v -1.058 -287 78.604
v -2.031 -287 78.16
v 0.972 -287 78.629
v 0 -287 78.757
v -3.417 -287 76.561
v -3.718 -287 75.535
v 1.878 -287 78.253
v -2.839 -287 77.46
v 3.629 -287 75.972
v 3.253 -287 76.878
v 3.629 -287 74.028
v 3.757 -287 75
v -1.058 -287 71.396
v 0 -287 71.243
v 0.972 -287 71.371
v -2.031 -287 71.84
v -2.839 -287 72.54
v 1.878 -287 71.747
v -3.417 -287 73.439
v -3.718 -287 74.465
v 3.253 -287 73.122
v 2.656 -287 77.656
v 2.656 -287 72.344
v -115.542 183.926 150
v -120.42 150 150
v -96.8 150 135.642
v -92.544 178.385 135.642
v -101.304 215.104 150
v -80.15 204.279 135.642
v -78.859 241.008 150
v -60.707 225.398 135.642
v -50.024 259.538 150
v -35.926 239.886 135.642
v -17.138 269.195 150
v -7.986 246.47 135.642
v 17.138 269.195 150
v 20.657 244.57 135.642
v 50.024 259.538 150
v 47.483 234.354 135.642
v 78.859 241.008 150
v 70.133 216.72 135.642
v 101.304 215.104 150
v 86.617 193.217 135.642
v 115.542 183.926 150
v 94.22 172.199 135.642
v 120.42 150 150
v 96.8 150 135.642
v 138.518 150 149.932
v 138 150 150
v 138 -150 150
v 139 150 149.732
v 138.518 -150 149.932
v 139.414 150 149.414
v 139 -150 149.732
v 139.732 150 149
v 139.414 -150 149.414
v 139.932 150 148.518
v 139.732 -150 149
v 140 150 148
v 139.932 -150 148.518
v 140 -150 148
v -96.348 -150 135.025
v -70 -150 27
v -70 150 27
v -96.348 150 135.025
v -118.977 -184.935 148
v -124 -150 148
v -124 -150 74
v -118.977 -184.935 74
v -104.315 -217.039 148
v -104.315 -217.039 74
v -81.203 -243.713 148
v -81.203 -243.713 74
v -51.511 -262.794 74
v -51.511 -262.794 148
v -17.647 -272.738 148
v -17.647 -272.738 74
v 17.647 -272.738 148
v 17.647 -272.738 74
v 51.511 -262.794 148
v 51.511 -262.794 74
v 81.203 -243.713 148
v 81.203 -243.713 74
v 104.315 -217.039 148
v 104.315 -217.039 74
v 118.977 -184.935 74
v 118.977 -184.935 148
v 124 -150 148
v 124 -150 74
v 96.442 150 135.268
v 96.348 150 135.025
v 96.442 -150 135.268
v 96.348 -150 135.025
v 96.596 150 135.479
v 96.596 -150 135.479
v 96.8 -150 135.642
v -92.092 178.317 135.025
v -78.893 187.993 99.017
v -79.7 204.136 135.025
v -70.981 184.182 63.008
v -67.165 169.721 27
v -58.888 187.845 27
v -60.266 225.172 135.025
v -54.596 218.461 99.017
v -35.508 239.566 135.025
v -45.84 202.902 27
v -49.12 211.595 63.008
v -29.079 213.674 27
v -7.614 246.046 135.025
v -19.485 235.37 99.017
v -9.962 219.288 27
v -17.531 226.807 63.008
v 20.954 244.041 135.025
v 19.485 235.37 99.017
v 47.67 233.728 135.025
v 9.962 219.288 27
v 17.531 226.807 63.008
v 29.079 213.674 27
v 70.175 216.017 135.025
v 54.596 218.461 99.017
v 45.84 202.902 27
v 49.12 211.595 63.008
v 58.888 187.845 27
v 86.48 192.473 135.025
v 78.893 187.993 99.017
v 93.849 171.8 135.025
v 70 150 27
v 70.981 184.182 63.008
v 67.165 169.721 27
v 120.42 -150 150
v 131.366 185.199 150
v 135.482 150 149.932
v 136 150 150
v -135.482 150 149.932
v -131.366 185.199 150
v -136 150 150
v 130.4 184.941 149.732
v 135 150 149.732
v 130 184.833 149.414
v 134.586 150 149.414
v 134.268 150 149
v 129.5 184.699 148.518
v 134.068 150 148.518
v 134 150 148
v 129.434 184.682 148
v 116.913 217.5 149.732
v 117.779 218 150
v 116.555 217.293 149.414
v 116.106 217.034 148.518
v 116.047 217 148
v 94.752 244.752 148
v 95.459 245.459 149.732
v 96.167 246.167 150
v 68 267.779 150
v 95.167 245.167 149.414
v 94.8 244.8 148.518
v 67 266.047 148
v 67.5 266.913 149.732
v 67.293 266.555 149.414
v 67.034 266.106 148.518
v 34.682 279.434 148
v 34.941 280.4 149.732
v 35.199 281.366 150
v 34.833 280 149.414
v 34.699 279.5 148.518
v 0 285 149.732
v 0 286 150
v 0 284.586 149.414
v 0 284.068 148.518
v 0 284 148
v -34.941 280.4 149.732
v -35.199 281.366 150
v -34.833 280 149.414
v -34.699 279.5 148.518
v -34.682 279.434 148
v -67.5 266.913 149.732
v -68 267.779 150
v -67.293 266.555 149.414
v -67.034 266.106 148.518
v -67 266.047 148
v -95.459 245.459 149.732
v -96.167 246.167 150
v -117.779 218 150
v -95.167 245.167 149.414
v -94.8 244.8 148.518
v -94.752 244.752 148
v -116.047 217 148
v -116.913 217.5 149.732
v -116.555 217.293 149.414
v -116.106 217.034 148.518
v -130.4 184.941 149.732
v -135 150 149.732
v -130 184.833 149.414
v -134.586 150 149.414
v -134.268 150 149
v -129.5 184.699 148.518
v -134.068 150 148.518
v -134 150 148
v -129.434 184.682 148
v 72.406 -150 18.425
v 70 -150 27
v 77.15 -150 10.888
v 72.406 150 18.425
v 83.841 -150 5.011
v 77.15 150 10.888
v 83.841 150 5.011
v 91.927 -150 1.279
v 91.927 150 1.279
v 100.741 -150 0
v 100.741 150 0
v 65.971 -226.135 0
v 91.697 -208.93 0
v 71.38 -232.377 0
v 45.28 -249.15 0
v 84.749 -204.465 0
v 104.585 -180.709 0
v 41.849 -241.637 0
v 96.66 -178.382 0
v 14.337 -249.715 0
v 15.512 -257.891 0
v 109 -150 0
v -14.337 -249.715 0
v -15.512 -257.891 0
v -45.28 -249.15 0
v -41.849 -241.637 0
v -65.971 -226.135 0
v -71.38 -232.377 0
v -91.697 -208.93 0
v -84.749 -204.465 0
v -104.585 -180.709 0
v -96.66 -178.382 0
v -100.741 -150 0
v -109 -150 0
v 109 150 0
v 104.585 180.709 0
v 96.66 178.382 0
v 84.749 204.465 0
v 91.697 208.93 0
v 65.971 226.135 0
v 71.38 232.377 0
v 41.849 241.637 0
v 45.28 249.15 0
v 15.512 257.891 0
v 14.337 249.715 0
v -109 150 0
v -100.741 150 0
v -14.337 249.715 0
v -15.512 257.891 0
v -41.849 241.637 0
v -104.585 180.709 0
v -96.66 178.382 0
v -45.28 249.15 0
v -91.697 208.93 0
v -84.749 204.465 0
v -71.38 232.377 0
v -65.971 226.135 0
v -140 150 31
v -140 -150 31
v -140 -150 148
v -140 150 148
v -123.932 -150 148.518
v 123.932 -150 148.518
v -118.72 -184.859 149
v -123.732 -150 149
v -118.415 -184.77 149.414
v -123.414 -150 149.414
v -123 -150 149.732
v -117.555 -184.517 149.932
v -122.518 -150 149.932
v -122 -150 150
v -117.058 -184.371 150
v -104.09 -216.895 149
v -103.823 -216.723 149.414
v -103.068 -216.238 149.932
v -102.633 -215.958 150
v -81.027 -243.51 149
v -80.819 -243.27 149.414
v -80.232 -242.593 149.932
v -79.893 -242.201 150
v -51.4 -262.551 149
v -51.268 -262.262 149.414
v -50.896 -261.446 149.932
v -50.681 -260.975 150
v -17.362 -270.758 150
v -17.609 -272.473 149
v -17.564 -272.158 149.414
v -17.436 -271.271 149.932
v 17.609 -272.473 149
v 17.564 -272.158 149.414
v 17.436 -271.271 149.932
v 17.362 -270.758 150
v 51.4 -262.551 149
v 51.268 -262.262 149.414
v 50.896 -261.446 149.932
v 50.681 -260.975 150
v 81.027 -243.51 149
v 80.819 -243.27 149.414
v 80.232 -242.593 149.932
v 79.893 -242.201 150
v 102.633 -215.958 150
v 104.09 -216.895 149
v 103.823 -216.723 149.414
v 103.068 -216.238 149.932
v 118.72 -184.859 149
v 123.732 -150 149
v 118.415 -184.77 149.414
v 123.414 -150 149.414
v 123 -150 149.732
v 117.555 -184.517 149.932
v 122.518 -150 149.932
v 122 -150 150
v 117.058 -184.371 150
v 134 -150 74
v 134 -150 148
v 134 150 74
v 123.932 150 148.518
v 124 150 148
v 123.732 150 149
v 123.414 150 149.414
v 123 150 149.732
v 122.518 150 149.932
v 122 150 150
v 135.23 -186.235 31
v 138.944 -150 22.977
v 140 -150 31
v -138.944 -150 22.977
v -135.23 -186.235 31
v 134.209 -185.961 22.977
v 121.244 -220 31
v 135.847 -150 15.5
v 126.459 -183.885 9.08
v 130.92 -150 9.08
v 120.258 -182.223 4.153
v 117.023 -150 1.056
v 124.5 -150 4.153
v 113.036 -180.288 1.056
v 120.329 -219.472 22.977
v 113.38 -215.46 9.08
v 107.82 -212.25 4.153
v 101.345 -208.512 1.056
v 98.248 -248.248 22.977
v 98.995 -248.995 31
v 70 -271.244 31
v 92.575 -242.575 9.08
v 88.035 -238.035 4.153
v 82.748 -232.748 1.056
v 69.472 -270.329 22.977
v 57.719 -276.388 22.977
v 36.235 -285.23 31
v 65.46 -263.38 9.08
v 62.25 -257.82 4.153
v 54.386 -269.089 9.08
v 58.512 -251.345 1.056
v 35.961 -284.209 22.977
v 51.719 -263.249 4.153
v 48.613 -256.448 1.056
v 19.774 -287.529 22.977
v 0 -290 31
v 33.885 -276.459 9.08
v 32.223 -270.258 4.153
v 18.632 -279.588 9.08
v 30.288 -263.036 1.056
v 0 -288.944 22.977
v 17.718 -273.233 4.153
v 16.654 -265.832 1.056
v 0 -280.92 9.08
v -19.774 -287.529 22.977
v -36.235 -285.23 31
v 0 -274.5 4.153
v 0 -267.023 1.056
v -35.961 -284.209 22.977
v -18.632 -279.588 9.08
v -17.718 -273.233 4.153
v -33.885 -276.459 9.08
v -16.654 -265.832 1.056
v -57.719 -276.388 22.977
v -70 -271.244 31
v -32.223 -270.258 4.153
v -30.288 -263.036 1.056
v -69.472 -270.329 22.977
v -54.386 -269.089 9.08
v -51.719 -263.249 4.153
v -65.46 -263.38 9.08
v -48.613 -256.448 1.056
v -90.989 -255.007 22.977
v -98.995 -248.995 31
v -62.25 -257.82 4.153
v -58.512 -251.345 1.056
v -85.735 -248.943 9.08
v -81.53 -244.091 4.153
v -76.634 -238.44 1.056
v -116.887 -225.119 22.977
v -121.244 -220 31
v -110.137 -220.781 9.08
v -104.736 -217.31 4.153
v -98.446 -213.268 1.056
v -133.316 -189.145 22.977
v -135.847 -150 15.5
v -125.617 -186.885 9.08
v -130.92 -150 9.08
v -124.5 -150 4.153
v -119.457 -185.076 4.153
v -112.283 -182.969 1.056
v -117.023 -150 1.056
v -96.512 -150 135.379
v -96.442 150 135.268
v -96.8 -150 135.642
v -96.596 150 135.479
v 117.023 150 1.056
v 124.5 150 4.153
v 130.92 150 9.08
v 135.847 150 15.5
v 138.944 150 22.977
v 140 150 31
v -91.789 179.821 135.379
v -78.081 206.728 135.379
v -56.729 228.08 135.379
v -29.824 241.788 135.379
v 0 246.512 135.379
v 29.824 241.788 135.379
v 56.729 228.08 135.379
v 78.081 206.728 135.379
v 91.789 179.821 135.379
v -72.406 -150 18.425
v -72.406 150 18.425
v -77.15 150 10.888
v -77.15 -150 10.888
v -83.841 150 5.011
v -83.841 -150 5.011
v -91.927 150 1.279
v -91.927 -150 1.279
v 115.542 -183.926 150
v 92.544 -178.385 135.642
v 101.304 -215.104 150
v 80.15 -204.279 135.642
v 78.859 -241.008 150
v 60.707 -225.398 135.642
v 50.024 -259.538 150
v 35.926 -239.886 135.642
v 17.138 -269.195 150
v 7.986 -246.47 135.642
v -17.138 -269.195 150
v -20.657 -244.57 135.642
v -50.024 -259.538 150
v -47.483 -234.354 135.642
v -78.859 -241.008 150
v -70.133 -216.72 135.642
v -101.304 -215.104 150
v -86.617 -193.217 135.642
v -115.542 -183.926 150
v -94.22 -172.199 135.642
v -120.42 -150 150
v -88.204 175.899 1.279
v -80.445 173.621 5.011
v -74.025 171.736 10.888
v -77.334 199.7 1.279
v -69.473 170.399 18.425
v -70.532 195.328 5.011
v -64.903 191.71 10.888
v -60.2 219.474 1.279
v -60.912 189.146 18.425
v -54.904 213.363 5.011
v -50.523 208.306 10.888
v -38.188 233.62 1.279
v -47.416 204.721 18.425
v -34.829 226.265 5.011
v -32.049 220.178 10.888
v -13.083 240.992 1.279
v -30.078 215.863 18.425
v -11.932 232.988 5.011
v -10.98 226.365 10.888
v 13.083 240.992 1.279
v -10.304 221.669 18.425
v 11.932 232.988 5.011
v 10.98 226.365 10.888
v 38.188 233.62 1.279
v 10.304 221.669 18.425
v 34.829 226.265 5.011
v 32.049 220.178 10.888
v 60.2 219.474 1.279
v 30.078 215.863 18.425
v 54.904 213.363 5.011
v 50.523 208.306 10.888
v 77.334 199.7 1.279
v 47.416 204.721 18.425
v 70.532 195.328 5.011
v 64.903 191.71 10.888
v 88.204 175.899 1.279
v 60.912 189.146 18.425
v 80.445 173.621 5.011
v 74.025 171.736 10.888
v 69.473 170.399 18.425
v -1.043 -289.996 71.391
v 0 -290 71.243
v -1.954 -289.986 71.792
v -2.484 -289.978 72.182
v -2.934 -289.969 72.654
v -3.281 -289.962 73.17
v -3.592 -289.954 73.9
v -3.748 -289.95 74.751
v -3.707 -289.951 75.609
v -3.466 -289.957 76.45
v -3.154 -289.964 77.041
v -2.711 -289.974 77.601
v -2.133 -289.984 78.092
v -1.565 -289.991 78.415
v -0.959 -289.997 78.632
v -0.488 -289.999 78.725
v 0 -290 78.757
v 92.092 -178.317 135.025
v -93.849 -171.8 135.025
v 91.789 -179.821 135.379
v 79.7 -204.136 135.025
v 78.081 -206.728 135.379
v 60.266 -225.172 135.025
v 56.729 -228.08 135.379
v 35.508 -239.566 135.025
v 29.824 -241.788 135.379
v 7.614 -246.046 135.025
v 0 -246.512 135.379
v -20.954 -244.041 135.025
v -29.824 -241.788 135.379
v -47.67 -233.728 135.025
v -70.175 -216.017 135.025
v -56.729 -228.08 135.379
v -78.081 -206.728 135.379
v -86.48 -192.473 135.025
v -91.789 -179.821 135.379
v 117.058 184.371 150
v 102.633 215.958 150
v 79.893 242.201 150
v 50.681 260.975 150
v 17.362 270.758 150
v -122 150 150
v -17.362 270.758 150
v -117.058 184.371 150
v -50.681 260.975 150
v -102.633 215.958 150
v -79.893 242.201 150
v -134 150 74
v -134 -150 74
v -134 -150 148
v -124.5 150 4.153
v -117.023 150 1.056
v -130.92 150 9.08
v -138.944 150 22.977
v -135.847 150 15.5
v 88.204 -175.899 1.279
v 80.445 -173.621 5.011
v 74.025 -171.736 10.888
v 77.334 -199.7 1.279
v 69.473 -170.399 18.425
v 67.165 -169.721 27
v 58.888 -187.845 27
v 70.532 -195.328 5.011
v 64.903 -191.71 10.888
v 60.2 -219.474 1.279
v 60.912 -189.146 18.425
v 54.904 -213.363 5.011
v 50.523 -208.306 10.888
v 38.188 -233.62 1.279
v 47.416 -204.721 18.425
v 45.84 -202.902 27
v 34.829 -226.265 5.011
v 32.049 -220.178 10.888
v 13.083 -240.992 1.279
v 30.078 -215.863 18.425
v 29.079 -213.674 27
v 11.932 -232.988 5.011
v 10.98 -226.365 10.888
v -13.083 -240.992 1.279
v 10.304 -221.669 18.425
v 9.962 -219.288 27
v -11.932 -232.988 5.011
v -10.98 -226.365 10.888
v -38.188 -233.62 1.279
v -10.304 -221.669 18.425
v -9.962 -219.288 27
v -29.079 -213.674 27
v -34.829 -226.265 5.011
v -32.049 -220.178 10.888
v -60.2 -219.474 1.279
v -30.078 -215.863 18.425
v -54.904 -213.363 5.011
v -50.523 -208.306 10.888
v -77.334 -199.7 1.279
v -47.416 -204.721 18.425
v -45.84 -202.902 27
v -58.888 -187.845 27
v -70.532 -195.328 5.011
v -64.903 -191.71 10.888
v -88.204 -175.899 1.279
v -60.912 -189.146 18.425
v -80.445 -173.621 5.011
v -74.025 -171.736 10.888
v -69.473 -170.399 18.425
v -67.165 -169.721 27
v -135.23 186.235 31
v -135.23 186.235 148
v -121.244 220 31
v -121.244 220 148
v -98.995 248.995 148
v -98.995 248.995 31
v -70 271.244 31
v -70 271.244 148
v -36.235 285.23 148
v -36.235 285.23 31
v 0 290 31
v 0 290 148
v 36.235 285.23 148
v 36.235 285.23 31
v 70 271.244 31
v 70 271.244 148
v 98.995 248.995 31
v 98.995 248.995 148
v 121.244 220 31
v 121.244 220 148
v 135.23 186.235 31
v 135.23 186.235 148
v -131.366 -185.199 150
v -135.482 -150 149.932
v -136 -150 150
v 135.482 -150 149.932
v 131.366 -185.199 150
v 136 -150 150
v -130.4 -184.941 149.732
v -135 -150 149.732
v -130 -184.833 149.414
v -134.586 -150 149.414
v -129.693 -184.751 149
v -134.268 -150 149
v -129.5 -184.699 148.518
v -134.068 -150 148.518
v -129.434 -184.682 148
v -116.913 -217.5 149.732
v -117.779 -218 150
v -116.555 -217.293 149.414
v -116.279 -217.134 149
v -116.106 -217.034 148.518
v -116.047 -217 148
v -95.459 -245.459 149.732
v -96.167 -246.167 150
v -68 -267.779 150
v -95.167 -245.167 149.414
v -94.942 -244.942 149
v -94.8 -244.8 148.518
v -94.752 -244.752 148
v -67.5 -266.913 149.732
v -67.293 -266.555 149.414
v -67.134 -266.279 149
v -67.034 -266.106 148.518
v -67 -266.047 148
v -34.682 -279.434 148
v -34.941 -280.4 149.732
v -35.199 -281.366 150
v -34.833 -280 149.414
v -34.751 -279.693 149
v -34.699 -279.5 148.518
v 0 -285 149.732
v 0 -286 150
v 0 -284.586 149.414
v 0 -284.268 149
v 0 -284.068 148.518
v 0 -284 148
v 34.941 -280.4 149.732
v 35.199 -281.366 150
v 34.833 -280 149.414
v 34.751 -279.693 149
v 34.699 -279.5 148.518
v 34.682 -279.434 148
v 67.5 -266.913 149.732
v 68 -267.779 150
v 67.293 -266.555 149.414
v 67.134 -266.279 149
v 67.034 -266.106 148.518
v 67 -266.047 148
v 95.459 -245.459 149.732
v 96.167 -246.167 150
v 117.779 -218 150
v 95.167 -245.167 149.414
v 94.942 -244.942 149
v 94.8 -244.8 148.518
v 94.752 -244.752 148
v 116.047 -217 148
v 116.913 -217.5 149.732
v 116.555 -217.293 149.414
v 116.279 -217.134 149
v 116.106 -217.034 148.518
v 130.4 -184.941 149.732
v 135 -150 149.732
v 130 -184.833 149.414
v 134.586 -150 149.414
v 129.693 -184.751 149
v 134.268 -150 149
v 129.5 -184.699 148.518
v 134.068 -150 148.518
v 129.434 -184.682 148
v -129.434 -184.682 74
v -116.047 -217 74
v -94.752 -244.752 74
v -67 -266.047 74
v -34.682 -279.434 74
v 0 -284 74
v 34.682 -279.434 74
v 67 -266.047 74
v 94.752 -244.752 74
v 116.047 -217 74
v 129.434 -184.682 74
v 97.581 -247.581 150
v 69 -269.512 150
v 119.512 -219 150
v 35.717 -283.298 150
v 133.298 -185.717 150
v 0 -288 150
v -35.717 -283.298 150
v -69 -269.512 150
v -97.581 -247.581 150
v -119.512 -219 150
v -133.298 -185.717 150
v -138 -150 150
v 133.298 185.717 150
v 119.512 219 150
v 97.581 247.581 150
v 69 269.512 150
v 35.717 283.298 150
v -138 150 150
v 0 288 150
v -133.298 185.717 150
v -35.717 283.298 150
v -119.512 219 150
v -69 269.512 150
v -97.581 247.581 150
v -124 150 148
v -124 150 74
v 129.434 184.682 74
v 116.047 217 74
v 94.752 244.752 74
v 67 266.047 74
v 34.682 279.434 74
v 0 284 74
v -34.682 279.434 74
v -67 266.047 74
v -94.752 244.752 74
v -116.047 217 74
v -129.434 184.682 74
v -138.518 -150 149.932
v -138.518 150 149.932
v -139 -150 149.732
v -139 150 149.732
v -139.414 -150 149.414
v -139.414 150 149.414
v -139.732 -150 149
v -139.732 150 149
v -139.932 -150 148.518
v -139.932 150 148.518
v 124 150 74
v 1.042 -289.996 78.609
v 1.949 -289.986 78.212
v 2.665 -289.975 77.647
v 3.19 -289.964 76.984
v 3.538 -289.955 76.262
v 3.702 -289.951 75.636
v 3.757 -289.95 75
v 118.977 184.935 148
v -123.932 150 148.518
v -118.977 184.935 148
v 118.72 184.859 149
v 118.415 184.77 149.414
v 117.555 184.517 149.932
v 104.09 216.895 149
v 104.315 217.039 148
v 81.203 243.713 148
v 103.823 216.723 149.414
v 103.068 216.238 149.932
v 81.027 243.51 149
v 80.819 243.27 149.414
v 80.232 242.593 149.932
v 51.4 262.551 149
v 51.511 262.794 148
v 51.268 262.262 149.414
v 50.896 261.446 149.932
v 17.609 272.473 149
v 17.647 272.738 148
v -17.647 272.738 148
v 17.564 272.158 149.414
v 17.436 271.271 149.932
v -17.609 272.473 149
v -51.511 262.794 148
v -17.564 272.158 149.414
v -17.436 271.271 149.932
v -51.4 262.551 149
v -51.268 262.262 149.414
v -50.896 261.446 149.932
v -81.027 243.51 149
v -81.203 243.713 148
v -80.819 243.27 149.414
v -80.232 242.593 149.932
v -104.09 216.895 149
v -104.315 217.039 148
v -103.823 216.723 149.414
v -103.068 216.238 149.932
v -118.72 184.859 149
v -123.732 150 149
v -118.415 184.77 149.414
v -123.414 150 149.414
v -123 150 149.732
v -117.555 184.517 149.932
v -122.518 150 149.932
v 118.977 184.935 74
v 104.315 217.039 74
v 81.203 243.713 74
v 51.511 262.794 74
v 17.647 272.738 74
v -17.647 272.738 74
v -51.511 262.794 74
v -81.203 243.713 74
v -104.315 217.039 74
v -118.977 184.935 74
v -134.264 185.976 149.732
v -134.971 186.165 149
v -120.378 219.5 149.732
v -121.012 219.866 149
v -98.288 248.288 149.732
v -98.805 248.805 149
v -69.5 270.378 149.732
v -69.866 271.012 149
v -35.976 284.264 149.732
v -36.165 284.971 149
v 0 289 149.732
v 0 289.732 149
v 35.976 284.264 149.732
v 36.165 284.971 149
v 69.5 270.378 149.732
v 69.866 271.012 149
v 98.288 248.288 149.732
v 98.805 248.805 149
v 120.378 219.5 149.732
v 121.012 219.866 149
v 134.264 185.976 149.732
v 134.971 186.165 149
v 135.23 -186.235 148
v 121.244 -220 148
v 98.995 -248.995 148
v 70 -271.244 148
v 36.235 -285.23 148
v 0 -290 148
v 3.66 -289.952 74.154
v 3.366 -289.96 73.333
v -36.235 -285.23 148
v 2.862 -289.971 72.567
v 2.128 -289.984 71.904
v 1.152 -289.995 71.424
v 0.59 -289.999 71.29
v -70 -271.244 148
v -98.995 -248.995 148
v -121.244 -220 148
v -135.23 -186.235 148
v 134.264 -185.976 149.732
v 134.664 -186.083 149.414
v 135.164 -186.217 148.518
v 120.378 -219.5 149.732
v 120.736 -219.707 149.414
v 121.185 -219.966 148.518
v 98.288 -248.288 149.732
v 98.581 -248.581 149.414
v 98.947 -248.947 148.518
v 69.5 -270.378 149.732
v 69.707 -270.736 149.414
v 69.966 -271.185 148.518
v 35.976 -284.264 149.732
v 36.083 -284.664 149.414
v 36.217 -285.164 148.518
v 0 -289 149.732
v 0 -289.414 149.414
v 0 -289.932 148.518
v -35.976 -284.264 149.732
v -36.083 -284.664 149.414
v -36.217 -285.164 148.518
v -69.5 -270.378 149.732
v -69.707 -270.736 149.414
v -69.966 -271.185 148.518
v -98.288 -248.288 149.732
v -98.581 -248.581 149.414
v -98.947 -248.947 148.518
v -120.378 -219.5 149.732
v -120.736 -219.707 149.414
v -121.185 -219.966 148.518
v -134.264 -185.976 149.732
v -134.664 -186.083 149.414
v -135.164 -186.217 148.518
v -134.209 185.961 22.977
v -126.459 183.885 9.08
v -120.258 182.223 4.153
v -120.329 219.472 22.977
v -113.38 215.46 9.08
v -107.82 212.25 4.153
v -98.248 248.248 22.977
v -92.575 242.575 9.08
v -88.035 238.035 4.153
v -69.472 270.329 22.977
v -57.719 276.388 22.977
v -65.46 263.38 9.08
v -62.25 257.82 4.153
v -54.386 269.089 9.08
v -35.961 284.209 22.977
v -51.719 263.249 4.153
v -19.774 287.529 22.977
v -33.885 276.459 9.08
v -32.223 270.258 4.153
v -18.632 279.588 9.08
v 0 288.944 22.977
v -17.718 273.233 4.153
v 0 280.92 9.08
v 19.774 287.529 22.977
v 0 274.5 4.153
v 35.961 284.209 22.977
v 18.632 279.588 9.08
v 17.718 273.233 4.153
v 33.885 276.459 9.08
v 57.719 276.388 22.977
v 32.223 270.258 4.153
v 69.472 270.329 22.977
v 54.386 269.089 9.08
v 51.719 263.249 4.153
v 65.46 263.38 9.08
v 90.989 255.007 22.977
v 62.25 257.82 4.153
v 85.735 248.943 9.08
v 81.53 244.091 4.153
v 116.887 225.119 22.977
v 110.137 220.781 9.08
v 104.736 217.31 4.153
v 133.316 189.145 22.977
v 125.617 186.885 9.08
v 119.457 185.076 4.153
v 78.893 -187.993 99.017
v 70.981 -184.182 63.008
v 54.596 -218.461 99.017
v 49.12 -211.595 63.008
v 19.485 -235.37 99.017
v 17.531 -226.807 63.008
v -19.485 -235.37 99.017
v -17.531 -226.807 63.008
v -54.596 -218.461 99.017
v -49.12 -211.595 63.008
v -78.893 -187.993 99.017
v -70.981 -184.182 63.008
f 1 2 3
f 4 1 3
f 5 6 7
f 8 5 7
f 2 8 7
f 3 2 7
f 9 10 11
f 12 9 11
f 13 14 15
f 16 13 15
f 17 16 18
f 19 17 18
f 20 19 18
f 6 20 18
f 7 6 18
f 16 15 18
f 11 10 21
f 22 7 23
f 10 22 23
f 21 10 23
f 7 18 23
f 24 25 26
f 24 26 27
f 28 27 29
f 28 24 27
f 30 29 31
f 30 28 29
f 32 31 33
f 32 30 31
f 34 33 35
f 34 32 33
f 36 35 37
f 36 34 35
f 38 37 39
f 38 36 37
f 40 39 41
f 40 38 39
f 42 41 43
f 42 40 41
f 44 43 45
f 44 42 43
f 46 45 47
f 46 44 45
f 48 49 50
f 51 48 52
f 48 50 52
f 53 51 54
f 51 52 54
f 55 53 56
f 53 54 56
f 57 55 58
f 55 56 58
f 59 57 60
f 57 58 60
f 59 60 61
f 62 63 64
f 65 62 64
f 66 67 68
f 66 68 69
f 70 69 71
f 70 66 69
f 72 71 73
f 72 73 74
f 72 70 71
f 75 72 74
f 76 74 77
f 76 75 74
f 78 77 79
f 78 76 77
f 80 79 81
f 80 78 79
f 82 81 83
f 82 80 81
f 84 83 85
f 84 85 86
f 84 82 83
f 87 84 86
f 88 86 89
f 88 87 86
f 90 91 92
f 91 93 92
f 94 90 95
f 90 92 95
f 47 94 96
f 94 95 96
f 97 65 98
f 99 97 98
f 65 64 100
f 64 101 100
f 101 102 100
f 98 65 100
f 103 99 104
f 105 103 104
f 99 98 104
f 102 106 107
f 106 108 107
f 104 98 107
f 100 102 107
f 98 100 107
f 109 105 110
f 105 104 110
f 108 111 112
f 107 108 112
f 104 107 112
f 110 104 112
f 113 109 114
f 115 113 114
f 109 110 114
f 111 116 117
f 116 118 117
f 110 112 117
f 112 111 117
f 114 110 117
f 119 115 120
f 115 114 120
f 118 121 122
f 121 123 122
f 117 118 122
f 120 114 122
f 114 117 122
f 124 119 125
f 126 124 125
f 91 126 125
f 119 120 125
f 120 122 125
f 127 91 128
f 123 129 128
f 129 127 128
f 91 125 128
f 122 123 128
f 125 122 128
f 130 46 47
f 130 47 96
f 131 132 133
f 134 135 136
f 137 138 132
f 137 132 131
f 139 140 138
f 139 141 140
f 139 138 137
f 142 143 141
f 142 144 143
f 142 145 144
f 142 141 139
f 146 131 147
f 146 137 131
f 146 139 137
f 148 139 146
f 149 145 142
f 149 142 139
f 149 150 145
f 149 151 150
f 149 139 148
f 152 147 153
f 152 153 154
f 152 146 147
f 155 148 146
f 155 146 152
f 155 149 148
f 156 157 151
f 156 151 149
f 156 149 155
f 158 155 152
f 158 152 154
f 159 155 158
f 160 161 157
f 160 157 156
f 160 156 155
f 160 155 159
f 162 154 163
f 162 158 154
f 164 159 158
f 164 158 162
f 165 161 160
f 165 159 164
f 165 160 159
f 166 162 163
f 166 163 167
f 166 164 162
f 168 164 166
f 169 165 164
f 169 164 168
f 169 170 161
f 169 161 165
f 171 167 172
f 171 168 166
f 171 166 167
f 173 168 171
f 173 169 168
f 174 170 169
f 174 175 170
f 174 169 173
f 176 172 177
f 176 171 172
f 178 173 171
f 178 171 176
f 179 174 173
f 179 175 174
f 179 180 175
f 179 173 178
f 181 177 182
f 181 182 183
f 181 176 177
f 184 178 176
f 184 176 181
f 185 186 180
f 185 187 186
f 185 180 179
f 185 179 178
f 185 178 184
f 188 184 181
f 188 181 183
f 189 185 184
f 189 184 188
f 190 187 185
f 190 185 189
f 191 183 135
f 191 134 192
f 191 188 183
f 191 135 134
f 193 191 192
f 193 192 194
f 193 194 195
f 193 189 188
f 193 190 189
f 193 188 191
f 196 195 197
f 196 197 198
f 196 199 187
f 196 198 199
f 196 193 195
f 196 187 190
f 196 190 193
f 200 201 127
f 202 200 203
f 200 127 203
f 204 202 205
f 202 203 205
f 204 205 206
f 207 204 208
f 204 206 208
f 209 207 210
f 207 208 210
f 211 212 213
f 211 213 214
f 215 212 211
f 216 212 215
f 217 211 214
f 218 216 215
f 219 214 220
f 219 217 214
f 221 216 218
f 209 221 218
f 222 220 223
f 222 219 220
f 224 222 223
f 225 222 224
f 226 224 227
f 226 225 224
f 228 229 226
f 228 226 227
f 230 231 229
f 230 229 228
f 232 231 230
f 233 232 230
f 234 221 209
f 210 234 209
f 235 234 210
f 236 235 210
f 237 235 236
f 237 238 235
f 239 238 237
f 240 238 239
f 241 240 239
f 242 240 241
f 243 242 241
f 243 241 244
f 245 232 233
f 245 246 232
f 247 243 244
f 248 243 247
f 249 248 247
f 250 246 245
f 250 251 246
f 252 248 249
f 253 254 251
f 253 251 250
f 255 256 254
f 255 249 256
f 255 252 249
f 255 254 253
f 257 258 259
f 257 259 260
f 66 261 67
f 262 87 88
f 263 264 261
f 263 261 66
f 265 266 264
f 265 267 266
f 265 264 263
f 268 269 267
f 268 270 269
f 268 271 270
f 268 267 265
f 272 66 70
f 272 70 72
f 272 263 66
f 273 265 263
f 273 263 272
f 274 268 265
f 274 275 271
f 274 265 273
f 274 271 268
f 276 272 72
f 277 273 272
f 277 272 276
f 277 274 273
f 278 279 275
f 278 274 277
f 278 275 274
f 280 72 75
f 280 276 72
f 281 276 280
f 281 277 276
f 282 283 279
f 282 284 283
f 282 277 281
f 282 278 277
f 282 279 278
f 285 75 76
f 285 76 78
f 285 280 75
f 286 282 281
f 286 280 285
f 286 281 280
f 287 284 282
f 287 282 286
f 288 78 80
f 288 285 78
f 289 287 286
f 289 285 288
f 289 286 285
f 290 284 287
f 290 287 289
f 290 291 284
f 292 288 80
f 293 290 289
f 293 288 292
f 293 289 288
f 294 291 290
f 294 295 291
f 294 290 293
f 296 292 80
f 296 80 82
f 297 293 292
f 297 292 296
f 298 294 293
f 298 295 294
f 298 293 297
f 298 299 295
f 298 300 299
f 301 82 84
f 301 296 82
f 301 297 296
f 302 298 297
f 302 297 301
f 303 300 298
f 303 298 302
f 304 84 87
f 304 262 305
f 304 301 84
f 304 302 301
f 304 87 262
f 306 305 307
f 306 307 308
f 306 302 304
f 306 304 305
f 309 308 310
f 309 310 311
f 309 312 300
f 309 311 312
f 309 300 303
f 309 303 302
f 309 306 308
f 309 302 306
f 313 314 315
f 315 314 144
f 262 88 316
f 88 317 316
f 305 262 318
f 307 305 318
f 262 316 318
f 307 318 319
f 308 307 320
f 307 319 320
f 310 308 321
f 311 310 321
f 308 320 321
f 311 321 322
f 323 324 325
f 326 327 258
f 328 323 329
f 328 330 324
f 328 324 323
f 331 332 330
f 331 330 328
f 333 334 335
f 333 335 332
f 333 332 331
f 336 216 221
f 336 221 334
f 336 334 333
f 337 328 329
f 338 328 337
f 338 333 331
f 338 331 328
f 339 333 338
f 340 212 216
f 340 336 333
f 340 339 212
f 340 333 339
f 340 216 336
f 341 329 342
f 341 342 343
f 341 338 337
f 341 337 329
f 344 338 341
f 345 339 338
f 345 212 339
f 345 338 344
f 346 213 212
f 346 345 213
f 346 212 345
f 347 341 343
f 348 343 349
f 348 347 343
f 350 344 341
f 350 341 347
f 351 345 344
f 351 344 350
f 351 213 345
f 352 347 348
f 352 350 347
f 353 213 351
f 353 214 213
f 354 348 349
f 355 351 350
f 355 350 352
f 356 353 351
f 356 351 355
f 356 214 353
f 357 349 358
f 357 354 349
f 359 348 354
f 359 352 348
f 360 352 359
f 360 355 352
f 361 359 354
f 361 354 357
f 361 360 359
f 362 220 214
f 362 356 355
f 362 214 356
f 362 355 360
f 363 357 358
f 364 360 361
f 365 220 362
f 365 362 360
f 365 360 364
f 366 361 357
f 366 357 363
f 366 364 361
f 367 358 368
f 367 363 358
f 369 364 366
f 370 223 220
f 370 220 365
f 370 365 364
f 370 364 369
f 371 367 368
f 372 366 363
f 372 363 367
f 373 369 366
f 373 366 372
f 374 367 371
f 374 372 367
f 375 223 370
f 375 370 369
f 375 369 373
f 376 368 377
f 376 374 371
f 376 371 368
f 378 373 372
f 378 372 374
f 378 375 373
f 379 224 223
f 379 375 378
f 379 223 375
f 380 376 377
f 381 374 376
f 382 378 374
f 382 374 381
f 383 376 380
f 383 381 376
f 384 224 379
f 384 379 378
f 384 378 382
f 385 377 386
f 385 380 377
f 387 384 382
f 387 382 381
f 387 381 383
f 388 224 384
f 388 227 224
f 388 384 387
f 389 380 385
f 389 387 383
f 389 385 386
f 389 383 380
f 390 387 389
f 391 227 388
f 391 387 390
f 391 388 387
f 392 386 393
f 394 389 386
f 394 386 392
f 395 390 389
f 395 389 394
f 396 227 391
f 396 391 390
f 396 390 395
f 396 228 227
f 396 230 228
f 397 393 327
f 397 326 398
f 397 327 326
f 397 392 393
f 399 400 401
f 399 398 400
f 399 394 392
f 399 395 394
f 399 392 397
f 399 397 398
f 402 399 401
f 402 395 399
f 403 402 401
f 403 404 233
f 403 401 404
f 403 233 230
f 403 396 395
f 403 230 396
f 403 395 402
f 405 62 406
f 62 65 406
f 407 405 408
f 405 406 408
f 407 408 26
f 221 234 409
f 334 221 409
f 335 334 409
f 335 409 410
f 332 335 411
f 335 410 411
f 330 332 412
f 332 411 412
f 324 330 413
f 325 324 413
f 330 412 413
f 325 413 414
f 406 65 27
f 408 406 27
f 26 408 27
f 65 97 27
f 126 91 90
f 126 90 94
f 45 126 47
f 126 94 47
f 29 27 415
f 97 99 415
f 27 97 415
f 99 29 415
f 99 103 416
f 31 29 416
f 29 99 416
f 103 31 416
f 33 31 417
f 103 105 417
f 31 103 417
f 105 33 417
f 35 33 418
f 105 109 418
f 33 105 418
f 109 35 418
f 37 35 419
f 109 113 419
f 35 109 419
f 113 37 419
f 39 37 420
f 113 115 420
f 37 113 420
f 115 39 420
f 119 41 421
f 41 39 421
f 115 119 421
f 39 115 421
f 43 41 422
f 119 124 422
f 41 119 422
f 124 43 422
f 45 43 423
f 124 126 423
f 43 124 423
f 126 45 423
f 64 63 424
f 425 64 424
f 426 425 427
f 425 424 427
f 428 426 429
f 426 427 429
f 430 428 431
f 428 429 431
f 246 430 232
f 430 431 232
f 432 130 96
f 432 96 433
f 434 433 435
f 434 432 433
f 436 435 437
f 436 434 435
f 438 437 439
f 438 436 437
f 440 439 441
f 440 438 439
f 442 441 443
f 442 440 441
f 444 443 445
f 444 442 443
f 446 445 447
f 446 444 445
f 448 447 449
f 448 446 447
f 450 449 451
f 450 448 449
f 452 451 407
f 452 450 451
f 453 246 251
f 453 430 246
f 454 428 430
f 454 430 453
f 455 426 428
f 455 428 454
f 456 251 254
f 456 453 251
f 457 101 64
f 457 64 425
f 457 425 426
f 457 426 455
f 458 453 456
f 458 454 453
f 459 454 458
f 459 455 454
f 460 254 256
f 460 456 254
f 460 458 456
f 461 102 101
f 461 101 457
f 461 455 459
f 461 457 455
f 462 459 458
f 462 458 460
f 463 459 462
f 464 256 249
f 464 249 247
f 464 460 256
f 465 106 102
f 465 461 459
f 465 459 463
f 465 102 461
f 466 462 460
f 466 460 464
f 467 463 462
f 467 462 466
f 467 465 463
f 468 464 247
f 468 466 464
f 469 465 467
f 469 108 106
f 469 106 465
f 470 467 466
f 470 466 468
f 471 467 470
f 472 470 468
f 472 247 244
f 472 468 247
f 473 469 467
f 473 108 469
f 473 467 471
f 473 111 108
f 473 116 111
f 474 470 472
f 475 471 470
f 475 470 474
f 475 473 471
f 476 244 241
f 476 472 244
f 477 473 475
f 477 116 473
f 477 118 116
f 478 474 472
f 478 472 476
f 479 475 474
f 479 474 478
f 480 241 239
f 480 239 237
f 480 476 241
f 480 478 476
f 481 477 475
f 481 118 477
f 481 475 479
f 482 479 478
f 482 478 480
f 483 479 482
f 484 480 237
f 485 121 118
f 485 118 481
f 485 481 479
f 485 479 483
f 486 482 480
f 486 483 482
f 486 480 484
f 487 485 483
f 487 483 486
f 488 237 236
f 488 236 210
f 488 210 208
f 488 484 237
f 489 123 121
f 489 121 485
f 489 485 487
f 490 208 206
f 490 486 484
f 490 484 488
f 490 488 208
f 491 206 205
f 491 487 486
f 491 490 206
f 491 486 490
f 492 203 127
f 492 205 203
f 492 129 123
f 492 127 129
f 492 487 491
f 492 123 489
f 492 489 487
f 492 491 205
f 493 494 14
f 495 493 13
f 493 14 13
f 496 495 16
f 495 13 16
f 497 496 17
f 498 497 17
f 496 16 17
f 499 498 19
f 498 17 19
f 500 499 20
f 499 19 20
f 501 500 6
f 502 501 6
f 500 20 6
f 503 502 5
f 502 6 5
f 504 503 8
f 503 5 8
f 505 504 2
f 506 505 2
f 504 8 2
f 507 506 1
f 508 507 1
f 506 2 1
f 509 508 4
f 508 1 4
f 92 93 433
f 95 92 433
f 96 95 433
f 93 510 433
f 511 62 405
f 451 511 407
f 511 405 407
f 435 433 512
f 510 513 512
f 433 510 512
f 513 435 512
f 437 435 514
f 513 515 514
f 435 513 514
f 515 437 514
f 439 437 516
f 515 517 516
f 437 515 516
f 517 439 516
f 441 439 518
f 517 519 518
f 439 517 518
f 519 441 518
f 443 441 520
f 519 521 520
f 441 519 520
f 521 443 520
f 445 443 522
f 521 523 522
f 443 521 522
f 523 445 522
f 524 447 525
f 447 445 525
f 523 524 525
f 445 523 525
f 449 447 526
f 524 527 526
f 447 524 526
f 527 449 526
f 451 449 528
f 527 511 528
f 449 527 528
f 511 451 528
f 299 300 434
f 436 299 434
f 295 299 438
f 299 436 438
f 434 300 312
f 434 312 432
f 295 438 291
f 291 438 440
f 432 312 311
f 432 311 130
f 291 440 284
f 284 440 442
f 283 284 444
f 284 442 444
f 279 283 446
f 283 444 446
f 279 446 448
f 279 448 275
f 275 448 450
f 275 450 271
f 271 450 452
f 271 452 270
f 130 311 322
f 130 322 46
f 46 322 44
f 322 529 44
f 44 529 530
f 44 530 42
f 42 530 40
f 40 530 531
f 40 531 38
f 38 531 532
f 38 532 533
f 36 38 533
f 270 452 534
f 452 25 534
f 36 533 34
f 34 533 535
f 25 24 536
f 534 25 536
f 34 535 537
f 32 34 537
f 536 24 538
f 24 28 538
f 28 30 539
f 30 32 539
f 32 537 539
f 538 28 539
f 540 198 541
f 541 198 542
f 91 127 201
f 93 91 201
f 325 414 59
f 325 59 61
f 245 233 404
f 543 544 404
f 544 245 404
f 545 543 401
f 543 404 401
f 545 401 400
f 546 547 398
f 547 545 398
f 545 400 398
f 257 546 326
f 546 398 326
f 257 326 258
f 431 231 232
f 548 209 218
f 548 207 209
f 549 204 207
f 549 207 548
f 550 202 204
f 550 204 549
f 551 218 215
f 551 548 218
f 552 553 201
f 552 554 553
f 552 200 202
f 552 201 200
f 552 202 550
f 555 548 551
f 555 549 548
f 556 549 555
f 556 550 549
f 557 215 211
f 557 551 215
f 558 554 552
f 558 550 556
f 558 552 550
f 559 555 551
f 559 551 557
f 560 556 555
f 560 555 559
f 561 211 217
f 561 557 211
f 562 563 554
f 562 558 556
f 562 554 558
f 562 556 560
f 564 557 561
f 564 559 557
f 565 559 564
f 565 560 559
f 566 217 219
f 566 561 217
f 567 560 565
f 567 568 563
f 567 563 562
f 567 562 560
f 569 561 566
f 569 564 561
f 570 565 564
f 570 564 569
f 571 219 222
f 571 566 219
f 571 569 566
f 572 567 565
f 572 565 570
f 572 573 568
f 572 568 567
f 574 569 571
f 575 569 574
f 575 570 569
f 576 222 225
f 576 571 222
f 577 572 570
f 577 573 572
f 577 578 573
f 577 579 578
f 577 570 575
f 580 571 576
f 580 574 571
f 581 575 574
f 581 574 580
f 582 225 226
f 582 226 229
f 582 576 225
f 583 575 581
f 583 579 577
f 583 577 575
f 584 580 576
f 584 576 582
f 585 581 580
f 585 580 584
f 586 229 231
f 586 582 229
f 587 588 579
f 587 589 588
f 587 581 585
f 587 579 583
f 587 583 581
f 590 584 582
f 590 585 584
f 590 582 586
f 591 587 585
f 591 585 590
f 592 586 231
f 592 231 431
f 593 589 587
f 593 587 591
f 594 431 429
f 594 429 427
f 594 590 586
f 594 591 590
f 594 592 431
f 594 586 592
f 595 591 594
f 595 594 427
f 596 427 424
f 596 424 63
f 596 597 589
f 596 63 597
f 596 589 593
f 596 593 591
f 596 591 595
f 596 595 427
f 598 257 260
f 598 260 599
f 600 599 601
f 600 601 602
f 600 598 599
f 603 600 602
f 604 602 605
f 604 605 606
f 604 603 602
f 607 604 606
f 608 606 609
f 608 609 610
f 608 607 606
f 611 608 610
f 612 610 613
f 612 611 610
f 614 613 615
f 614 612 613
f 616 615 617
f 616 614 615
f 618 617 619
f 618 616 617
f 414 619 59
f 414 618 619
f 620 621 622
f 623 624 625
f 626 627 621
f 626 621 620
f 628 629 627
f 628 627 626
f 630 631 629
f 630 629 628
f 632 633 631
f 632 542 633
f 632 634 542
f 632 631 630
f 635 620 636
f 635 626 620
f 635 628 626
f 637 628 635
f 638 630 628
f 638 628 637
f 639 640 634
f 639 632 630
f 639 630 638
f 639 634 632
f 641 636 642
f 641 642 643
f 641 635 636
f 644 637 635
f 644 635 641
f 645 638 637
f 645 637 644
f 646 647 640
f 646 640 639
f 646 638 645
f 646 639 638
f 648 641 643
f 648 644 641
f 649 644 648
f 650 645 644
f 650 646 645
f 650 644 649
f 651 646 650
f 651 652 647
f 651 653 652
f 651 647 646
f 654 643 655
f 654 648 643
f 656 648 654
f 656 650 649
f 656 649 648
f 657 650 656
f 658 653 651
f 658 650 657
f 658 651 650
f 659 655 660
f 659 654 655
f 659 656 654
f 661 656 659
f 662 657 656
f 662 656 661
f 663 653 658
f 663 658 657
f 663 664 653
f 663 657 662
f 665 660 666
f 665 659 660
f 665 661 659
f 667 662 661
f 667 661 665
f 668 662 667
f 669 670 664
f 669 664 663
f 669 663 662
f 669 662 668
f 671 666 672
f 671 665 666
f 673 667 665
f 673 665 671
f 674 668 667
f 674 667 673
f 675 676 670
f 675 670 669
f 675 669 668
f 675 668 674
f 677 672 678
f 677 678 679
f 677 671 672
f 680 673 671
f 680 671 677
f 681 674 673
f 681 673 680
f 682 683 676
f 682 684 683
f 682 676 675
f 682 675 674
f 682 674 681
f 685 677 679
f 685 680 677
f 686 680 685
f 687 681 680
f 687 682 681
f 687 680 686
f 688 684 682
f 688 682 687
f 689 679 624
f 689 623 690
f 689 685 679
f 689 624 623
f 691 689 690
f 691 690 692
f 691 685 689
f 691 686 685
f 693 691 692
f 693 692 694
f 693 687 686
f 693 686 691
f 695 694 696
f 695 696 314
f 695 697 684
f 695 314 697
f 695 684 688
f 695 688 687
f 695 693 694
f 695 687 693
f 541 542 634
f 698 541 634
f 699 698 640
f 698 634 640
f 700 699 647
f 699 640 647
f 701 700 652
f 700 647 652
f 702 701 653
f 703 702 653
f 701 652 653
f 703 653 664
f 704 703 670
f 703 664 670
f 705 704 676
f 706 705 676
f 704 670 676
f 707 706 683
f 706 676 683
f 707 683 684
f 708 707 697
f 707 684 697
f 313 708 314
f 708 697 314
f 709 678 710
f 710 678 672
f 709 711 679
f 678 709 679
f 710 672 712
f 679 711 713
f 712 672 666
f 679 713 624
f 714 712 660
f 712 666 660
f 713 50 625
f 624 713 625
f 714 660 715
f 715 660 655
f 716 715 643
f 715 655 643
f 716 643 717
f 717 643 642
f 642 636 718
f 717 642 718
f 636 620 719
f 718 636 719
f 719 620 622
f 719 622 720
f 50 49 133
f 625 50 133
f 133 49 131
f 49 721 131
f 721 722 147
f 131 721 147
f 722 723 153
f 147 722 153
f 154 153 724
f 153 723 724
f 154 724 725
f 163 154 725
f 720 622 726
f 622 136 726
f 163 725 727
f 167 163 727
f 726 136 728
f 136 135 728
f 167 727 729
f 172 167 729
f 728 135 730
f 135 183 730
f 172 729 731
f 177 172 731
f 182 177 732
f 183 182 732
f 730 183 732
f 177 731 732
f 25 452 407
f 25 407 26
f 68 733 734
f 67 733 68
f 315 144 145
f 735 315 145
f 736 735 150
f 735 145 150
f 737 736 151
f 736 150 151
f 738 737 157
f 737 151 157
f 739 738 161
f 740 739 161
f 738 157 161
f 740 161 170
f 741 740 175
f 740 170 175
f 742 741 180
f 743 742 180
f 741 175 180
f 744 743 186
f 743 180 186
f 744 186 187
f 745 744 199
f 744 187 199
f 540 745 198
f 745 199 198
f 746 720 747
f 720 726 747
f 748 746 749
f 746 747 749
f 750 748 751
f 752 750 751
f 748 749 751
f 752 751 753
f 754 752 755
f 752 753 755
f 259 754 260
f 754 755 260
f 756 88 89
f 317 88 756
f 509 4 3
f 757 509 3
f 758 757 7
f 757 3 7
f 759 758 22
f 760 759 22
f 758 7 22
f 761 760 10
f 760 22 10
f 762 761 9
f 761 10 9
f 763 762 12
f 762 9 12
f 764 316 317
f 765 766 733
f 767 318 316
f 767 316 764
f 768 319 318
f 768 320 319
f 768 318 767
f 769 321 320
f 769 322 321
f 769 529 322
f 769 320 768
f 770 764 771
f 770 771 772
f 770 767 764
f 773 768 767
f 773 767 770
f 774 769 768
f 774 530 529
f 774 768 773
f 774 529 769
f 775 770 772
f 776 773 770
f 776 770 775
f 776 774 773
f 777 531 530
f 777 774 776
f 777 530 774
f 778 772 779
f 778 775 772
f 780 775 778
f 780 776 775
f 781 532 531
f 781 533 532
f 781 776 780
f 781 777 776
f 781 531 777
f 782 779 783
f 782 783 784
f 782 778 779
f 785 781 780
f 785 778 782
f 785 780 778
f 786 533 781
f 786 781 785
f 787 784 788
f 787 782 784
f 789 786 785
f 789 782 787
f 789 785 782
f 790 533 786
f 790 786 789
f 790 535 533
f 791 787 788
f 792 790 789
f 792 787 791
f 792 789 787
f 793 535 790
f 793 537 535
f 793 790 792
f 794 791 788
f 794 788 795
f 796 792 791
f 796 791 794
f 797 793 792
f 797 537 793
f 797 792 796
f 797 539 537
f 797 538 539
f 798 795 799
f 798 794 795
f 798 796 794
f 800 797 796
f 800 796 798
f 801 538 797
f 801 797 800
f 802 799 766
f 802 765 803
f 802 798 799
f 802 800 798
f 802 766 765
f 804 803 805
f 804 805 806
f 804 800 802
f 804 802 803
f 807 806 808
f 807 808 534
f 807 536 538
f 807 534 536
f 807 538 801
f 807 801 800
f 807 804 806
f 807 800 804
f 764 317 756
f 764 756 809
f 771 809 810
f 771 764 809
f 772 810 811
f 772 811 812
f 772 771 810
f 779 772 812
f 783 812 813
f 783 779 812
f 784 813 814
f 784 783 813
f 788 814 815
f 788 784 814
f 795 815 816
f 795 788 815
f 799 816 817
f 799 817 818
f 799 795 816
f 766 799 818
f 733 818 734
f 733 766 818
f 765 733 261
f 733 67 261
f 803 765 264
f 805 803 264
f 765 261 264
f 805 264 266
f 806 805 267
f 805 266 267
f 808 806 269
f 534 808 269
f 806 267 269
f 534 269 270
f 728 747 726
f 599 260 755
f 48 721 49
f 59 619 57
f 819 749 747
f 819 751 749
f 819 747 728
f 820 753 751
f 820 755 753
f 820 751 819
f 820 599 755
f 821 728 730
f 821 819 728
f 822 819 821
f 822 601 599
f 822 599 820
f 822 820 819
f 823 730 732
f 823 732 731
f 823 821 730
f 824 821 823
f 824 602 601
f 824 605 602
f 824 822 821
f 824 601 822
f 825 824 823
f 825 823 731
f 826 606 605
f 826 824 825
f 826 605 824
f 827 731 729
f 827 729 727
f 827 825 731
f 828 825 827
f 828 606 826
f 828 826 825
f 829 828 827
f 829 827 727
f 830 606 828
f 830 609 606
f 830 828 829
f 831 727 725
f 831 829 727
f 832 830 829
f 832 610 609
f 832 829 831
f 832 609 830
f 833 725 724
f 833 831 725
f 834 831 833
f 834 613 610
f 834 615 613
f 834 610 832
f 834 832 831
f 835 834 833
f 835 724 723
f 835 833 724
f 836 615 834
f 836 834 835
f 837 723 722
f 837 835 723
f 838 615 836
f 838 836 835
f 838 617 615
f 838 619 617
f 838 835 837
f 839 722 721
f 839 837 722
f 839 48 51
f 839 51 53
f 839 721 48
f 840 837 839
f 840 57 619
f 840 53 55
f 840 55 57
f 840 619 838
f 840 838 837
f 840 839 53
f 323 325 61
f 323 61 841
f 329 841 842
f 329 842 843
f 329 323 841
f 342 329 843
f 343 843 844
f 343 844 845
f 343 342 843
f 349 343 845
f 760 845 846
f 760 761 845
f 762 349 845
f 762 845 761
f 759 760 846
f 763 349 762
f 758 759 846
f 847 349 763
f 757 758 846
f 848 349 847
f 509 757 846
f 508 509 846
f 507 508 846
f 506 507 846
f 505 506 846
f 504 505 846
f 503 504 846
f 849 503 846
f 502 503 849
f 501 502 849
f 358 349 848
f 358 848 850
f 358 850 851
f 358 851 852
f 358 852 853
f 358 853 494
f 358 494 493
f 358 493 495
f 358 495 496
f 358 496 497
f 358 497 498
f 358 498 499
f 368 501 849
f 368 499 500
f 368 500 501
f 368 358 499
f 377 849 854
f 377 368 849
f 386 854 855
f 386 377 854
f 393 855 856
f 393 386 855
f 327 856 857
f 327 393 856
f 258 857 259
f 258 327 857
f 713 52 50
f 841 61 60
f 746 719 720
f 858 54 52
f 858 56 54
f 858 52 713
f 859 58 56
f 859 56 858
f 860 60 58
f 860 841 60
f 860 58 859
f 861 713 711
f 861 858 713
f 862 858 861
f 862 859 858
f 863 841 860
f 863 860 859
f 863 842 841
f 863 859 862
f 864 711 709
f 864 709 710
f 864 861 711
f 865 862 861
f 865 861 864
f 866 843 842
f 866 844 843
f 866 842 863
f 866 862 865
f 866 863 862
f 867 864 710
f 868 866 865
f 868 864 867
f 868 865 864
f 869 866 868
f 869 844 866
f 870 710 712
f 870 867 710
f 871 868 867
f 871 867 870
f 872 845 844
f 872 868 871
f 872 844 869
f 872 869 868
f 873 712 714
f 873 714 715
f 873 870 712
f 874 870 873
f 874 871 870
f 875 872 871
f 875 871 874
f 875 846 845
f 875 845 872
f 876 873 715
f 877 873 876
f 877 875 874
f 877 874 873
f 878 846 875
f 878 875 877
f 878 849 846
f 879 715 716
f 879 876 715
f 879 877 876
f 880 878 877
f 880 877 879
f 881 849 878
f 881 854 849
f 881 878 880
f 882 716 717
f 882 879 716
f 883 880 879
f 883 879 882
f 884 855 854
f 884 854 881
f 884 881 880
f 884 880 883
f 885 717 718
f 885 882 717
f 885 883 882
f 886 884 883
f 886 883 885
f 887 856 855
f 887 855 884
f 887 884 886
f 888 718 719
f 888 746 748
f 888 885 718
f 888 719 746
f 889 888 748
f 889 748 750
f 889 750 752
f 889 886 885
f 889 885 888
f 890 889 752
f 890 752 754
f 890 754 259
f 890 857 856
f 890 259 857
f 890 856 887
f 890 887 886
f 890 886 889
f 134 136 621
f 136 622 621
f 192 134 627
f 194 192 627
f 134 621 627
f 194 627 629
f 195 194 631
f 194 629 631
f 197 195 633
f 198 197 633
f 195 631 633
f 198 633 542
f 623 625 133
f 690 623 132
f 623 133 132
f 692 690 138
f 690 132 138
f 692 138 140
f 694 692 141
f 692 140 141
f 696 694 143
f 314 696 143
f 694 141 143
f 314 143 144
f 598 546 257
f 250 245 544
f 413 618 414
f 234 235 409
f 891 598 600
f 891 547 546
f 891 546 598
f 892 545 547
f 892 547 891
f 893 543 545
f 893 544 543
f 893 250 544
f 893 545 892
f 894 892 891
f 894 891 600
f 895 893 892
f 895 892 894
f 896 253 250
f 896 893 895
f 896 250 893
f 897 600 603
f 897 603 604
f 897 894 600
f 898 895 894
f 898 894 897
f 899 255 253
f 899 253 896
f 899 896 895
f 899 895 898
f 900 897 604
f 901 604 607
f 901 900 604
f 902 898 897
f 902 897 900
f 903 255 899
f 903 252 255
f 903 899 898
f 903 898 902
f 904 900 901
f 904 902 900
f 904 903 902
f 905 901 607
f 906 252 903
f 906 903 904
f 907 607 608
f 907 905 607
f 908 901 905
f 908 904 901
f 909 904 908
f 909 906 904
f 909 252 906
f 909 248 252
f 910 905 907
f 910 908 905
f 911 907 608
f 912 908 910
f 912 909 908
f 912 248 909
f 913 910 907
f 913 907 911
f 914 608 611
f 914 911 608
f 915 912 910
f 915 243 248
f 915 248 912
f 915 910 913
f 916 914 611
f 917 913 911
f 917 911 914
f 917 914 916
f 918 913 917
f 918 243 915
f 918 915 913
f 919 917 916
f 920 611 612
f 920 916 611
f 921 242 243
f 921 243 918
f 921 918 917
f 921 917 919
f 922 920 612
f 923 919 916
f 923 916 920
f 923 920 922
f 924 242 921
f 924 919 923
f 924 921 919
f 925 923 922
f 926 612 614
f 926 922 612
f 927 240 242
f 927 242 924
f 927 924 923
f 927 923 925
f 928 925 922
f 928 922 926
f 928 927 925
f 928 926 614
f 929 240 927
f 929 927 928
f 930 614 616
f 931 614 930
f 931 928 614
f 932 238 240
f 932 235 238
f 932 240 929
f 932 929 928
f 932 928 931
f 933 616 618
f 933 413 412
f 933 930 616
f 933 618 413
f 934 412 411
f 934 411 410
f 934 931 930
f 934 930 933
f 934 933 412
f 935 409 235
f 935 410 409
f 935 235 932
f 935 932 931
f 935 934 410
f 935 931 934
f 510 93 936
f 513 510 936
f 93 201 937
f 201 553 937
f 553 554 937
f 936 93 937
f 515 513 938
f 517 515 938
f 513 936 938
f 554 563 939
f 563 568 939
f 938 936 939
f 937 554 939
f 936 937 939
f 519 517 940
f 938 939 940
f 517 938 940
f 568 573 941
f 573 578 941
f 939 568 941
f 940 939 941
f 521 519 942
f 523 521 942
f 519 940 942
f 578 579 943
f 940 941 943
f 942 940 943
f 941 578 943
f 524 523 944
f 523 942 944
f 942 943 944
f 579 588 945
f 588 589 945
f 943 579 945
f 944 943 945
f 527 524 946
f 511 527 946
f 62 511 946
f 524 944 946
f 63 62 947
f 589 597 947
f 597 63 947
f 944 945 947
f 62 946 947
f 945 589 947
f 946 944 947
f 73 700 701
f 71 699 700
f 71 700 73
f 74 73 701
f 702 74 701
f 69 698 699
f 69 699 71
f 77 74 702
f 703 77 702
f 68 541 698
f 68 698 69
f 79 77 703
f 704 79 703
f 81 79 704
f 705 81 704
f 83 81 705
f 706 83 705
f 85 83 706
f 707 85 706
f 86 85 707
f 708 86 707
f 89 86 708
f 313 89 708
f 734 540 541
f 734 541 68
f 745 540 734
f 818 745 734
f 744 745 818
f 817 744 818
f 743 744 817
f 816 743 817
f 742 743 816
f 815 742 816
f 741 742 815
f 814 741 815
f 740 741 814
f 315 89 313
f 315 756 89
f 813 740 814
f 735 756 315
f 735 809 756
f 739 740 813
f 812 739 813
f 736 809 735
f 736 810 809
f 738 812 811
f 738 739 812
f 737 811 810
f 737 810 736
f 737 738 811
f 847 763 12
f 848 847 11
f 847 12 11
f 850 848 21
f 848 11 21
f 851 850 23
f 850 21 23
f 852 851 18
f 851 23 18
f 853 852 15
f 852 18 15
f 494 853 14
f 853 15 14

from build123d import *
from OCP.BRepFilletAPI import BRepFilletAPI_MakeChamfer

# Parameters (mm, degrees)
Y_KSEKLIK_EKSTR_ZYON1_DEPTH = 150
KES_EKSTR_ZYON1_DEPTH       = 150
PAH1_SIZE                   = 30
PAH1_SIZE2                  = 123
KES_EKSTR_ZYON2_DEPTH       = 76
KES_EKSTR_ZYON3_START       = -287
KES_EKSTR_ZYON3_DEPTH       = 10
RADYUS1_R                   = 31
RADYUS2_R                   = 2
PAH2_SIZE                   = 15
PAH2_SIZE2                  = 20.420272109
RADYUS3_R                   = 1


with BuildPart() as part:
    # Çizim1 → Yükseklik-Ekstrüzyon1 (new body)
    with BuildSketch(Plane.XY):
        with BuildLine():
            Line((-140, -150), (-140, 150))
            ThreePointArc((-140, 150), (0, 290), (140, 150))
            Line((140, 150), (140, -150))
            ThreePointArc((140, -150), (0, -290), (-140, -150))
        make_face()
    extrude(amount=Y_KSEKLIK_EKSTR_ZYON1_DEPTH)

    # Çizim2 → Kes-Ekstrüzyon1 (cut)
    with BuildSketch(Plane.XY.offset(150)):
        with BuildLine():
            Line((-70, -150), (-70, 150))
            ThreePointArc((-70, 150), (0, 220), (70, 150))
            Line((70, 150), (70, -150))
            ThreePointArc((70, -150), (0, -220), (-70, -150))
        make_face()
    extrude(amount=-KES_EKSTR_ZYON1_DEPTH, mode=Mode.SUBTRACT)

    # Pah1
    pah1_edges = [part.edges().sort_by_distance(p)[0] for p in [
        (0, -220, 150),
        (70, 0, 150),
        (0, 220, 150),
        (-70, 0, 150),
    ]]
    pah1_side = [part.faces().sort_by_distance(p)[0] for p in [
        (133.559503125, 0, 150),
    ]]
    chamfer(pah1_edges, length=PAH1_SIZE, length2=PAH1_SIZE2, reference=pah1_side[0])

    # Çizim3 → Kes-Ekstrüzyon2 (cut)
    with BuildSketch(Plane.XY.offset(150)):
        with BuildLine():
            Line((-134, 150), (-134, -150))
            ThreePointArc((-134, -150), (0, -284), (134, -150))
            Line((134, -150), (134, 150))
            ThreePointArc((134, 150), (0, 284), (-134, 150))
        make_face()
        with BuildLine():
            ThreePointArc((-124, -150), (0, -274), (124, -150))
            Line((124, -150), (124, 150))
            ThreePointArc((124, 150), (0, 274), (-124, 150))
            Line((-124, 150), (-124, -150))
        make_face(mode=Mode.SUBTRACT)
    extrude(amount=-KES_EKSTR_ZYON2_DEPTH, mode=Mode.SUBTRACT)

    # Çizim4 → Kes-Ekstrüzyon3 (cut)
    with BuildSketch(Plane(origin=(0, 0, 0), x_dir=(1, 0, 0), z_dir=(0, 1, 0)).offset(KES_EKSTR_ZYON3_START)):
        with BuildLine():
            ThreePointArc((3.756627764, -75), (2.656336966, -72.343663034), (0, -71.243372236))
            Line((0, -71.243372236), (0, -78.756627764))
            ThreePointArc((0, -78.756627764), (2.656336966, -77.656336966), (3.756627764, -75))
        make_face()
        with BuildLine():
            Line((0, -78.756627764), (0, -71.243372236))
            ThreePointArc((0, -71.243372236), (-3.756627764, -75), (0, -78.756627764))
        make_face()
    extrude(amount=-KES_EKSTR_ZYON3_DEPTH, mode=Mode.SUBTRACT)

    # Radyus1
    # the kernel refuses this fillet: 31 mm, written as the material it takes off along each edge
    with BuildSketch(Plane(origin=(0, -150, 0), x_dir=(1, 0, 0), z_dir=(0, 1, 0))) as radyus1_piece_1:
        with BuildLine():
            CenterArc((100.740852298, -31), RADYUS1_R, 90, 82.586326198)
            Line((70, -27), (69.385182954, -26.92))
            ThreePointArc((69.385182954, -26.92), (69.38, -13.5), (69.38, 0))
            Line((69.38, 0), (70, 0.62))
            Line((70, 0.62), (100.740852298, 0.62))
            Line((100.740852298, 0.62), (100.740852298, 0))
        make_face()
    revolve(axis=Axis((0, -150, 0), (0, 0, -1)), revolution_arc=180, mode=Mode.SUBTRACT)
    with BuildSketch(Plane(origin=(-70, -150, 0), x_dir=(-1, 0, 0), z_dir=(0, 1, 0)), Plane(origin=(70, 150, 0), x_dir=(1, 0, 0), z_dir=(0, -1, 0))) as radyus1_piece_2:
        with BuildLine():
            CenterArc((30.740852298, 31), RADYUS1_R, 187.413673802, 82.586326198)
            Line((0, 27), (-0.614817046, 26.92))
            ThreePointArc((-0.614817046, 26.92), (-0.62, 13.5), (-0.62, 0))
            Line((-0.62, 0), (0, -0.62))
            Line((0, -0.62), (30.740852298, -0.62))
            Line((30.740852298, -0.62), (30.740852298, 0))
        make_face()
    extrude(amount=300, mode=Mode.SUBTRACT)
    with BuildSketch(Plane(origin=(0, 150, 0), x_dir=(-1, 0, 0), z_dir=(0, -1, 0))) as radyus1_piece_3:
        with BuildLine():
            CenterArc((100.740852298, -31), RADYUS1_R, 90, 82.586326198)
            Line((70, -27), (69.385182954, -26.92))
            ThreePointArc((69.385182954, -26.92), (69.38, -13.5), (69.38, 0))
            Line((69.38, 0), (70, 0.62))
            Line((70, 0.62), (100.740852298, 0.62))
            Line((100.740852298, 0.62), (100.740852298, 0))
        make_face()
    revolve(axis=Axis((0, 150, 0), (0, 0, -1)), revolution_arc=180, mode=Mode.SUBTRACT)
    with BuildSketch(Plane(origin=(0, 150, 0), x_dir=(-1, 0, 0), z_dir=(0, -1, 0))) as radyus1_piece_4:
        with BuildLine():
            CenterArc((140 - RADYUS1_R, -RADYUS1_R), RADYUS1_R, 0, 90)
            Line((140 - RADYUS1_R, 0), (140 - RADYUS1_R, RADYUS1_R * 0.02))
            Line((140 - RADYUS1_R, RADYUS1_R * 0.02), (140 + RADYUS1_R * 0.02, RADYUS1_R * 0.02))
            Line((140 + RADYUS1_R * 0.02, RADYUS1_R * 0.02), (140 + RADYUS1_R * 0.02, -RADYUS1_R))
            Line((140 + RADYUS1_R * 0.02, -RADYUS1_R), (140, -RADYUS1_R))
        make_face()
    revolve(axis=Axis((0, 150, 0), (0, 0, -1)), revolution_arc=180, mode=Mode.SUBTRACT)
    with BuildSketch(Plane(origin=(140, 150, 0), x_dir=(0, 0, 1), z_dir=(0, -1, 0)), Plane(origin=(-140, -150, 0), x_dir=(0, 0, 1), z_dir=(0, 1, 0))) as radyus1_piece_5:
        with BuildLine():
            CenterArc((RADYUS1_R, RADYUS1_R), RADYUS1_R, 180, 90)
            Line((0, RADYUS1_R), (-RADYUS1_R * 0.02, RADYUS1_R))
            Line((-RADYUS1_R * 0.02, RADYUS1_R), (-RADYUS1_R * 0.02, -RADYUS1_R * 0.02))
            Line((-RADYUS1_R * 0.02, -RADYUS1_R * 0.02), (RADYUS1_R, -RADYUS1_R * 0.02))
            Line((RADYUS1_R, -RADYUS1_R * 0.02), (RADYUS1_R, 0))
        make_face()
    extrude(amount=300, mode=Mode.SUBTRACT)
    with BuildSketch(Plane(origin=(0, -150, 0), x_dir=(1, 0, 0), z_dir=(0, 1, 0))) as radyus1_piece_6:
        with BuildLine():
            CenterArc((140 - RADYUS1_R, -RADYUS1_R), RADYUS1_R, 0, 90)
            Line((140 - RADYUS1_R, 0), (140 - RADYUS1_R, RADYUS1_R * 0.02))
            Line((140 - RADYUS1_R, RADYUS1_R * 0.02), (140 + RADYUS1_R * 0.02, RADYUS1_R * 0.02))
            Line((140 + RADYUS1_R * 0.02, RADYUS1_R * 0.02), (140 + RADYUS1_R * 0.02, -RADYUS1_R))
            Line((140 + RADYUS1_R * 0.02, -RADYUS1_R), (140, -RADYUS1_R))
        make_face()
    revolve(axis=Axis((0, -150, 0), (0, 0, -1)), revolution_arc=180, mode=Mode.SUBTRACT)

    # Radyus2
    radyus2_edges = [part.edges().sort_by_distance(p)[0] for p in [
        (0, 290, 150),
        (-140, 0, 150),
        (0, -290, 150),
        (0, -274, 150),
        (124, 0, 150),
        (0, 274, 150),
        (-124, 0, 150),
        (-134, 0, 150),
        (0, -284, 150),
        (134, 0, 150),
        (0, 284, 150),
        (140, 0, 150),
    ]]
    fillet(radyus2_edges, radius=RADYUS2_R)

    # Pah2: one chamfer whose edges measure the first distance from different faces: ONE call of the kernel's chamfer builder (chamfer() names one face for all edges)
    pah2_edges_1 = [part.edges().sort_by_distance(p)[0] for p in [
        (100, 0, 150),
    ]]
    pah2_side_1 = [part.faces().sort_by_distance(p)[0] for p in [
        (85, 0, 88.5),
    ]]
    pah2_edges_2 = [part.edges().sort_by_distance(p)[0] for p in [
        (0, 250, 150),
    ]]
    pah2_side_2 = [part.faces().sort_by_distance(p)[0] for p in [
        (0, 235, 88.5),
    ]]
    pah2_edges_3 = [part.edges().sort_by_distance(p)[0] for p in [
        (0, -250, 150),
    ]]
    pah2_side_3 = [part.faces().sort_by_distance(p)[0] for p in [
        (0, -235, 88.5),
    ]]
    pah2_edges_4 = [part.edges().sort_by_distance(p)[0] for p in [
        (-100, 0, 150),
    ]]
    pah2_side_4 = [part.faces().sort_by_distance(p)[0] for p in [
        (-85, 0, 88.5),
    ]]
    pah2 = BRepFilletAPI_MakeChamfer(part.part.solid().wrapped)
    for e in pah2_edges_1:
        pah2.Add(PAH2_SIZE, PAH2_SIZE2, e.wrapped, pah2_side_1[0].wrapped)  # the first distance lies on this face
    for e in pah2_edges_2:
        pah2.Add(PAH2_SIZE, PAH2_SIZE2, e.wrapped, pah2_side_2[0].wrapped)  # the first distance lies on this face
    for e in pah2_edges_3:
        pah2.Add(PAH2_SIZE, PAH2_SIZE2, e.wrapped, pah2_side_3[0].wrapped)  # the first distance lies on this face
    for e in pah2_edges_4:
        pah2.Add(PAH2_SIZE, PAH2_SIZE2, e.wrapped, pah2_side_4[0].wrapped)  # the first distance lies on this face
    add(Compound.cast(pah2.Shape()), mode=Mode.REPLACE)

    # Radyus3
    radyus3_edges = [part.edges().sort_by_distance(p)[0] for p in [
        (96.445657297, 0, 135.427194918),
        (0, -246.445657297, 135.427194918),
        (0, 246.445657297, 135.427194918),
        (-96.445657297, 0, 135.427194918),
    ]]
    fillet(radyus3_edges, radius=RADYUS3_R)


solid = part.part
